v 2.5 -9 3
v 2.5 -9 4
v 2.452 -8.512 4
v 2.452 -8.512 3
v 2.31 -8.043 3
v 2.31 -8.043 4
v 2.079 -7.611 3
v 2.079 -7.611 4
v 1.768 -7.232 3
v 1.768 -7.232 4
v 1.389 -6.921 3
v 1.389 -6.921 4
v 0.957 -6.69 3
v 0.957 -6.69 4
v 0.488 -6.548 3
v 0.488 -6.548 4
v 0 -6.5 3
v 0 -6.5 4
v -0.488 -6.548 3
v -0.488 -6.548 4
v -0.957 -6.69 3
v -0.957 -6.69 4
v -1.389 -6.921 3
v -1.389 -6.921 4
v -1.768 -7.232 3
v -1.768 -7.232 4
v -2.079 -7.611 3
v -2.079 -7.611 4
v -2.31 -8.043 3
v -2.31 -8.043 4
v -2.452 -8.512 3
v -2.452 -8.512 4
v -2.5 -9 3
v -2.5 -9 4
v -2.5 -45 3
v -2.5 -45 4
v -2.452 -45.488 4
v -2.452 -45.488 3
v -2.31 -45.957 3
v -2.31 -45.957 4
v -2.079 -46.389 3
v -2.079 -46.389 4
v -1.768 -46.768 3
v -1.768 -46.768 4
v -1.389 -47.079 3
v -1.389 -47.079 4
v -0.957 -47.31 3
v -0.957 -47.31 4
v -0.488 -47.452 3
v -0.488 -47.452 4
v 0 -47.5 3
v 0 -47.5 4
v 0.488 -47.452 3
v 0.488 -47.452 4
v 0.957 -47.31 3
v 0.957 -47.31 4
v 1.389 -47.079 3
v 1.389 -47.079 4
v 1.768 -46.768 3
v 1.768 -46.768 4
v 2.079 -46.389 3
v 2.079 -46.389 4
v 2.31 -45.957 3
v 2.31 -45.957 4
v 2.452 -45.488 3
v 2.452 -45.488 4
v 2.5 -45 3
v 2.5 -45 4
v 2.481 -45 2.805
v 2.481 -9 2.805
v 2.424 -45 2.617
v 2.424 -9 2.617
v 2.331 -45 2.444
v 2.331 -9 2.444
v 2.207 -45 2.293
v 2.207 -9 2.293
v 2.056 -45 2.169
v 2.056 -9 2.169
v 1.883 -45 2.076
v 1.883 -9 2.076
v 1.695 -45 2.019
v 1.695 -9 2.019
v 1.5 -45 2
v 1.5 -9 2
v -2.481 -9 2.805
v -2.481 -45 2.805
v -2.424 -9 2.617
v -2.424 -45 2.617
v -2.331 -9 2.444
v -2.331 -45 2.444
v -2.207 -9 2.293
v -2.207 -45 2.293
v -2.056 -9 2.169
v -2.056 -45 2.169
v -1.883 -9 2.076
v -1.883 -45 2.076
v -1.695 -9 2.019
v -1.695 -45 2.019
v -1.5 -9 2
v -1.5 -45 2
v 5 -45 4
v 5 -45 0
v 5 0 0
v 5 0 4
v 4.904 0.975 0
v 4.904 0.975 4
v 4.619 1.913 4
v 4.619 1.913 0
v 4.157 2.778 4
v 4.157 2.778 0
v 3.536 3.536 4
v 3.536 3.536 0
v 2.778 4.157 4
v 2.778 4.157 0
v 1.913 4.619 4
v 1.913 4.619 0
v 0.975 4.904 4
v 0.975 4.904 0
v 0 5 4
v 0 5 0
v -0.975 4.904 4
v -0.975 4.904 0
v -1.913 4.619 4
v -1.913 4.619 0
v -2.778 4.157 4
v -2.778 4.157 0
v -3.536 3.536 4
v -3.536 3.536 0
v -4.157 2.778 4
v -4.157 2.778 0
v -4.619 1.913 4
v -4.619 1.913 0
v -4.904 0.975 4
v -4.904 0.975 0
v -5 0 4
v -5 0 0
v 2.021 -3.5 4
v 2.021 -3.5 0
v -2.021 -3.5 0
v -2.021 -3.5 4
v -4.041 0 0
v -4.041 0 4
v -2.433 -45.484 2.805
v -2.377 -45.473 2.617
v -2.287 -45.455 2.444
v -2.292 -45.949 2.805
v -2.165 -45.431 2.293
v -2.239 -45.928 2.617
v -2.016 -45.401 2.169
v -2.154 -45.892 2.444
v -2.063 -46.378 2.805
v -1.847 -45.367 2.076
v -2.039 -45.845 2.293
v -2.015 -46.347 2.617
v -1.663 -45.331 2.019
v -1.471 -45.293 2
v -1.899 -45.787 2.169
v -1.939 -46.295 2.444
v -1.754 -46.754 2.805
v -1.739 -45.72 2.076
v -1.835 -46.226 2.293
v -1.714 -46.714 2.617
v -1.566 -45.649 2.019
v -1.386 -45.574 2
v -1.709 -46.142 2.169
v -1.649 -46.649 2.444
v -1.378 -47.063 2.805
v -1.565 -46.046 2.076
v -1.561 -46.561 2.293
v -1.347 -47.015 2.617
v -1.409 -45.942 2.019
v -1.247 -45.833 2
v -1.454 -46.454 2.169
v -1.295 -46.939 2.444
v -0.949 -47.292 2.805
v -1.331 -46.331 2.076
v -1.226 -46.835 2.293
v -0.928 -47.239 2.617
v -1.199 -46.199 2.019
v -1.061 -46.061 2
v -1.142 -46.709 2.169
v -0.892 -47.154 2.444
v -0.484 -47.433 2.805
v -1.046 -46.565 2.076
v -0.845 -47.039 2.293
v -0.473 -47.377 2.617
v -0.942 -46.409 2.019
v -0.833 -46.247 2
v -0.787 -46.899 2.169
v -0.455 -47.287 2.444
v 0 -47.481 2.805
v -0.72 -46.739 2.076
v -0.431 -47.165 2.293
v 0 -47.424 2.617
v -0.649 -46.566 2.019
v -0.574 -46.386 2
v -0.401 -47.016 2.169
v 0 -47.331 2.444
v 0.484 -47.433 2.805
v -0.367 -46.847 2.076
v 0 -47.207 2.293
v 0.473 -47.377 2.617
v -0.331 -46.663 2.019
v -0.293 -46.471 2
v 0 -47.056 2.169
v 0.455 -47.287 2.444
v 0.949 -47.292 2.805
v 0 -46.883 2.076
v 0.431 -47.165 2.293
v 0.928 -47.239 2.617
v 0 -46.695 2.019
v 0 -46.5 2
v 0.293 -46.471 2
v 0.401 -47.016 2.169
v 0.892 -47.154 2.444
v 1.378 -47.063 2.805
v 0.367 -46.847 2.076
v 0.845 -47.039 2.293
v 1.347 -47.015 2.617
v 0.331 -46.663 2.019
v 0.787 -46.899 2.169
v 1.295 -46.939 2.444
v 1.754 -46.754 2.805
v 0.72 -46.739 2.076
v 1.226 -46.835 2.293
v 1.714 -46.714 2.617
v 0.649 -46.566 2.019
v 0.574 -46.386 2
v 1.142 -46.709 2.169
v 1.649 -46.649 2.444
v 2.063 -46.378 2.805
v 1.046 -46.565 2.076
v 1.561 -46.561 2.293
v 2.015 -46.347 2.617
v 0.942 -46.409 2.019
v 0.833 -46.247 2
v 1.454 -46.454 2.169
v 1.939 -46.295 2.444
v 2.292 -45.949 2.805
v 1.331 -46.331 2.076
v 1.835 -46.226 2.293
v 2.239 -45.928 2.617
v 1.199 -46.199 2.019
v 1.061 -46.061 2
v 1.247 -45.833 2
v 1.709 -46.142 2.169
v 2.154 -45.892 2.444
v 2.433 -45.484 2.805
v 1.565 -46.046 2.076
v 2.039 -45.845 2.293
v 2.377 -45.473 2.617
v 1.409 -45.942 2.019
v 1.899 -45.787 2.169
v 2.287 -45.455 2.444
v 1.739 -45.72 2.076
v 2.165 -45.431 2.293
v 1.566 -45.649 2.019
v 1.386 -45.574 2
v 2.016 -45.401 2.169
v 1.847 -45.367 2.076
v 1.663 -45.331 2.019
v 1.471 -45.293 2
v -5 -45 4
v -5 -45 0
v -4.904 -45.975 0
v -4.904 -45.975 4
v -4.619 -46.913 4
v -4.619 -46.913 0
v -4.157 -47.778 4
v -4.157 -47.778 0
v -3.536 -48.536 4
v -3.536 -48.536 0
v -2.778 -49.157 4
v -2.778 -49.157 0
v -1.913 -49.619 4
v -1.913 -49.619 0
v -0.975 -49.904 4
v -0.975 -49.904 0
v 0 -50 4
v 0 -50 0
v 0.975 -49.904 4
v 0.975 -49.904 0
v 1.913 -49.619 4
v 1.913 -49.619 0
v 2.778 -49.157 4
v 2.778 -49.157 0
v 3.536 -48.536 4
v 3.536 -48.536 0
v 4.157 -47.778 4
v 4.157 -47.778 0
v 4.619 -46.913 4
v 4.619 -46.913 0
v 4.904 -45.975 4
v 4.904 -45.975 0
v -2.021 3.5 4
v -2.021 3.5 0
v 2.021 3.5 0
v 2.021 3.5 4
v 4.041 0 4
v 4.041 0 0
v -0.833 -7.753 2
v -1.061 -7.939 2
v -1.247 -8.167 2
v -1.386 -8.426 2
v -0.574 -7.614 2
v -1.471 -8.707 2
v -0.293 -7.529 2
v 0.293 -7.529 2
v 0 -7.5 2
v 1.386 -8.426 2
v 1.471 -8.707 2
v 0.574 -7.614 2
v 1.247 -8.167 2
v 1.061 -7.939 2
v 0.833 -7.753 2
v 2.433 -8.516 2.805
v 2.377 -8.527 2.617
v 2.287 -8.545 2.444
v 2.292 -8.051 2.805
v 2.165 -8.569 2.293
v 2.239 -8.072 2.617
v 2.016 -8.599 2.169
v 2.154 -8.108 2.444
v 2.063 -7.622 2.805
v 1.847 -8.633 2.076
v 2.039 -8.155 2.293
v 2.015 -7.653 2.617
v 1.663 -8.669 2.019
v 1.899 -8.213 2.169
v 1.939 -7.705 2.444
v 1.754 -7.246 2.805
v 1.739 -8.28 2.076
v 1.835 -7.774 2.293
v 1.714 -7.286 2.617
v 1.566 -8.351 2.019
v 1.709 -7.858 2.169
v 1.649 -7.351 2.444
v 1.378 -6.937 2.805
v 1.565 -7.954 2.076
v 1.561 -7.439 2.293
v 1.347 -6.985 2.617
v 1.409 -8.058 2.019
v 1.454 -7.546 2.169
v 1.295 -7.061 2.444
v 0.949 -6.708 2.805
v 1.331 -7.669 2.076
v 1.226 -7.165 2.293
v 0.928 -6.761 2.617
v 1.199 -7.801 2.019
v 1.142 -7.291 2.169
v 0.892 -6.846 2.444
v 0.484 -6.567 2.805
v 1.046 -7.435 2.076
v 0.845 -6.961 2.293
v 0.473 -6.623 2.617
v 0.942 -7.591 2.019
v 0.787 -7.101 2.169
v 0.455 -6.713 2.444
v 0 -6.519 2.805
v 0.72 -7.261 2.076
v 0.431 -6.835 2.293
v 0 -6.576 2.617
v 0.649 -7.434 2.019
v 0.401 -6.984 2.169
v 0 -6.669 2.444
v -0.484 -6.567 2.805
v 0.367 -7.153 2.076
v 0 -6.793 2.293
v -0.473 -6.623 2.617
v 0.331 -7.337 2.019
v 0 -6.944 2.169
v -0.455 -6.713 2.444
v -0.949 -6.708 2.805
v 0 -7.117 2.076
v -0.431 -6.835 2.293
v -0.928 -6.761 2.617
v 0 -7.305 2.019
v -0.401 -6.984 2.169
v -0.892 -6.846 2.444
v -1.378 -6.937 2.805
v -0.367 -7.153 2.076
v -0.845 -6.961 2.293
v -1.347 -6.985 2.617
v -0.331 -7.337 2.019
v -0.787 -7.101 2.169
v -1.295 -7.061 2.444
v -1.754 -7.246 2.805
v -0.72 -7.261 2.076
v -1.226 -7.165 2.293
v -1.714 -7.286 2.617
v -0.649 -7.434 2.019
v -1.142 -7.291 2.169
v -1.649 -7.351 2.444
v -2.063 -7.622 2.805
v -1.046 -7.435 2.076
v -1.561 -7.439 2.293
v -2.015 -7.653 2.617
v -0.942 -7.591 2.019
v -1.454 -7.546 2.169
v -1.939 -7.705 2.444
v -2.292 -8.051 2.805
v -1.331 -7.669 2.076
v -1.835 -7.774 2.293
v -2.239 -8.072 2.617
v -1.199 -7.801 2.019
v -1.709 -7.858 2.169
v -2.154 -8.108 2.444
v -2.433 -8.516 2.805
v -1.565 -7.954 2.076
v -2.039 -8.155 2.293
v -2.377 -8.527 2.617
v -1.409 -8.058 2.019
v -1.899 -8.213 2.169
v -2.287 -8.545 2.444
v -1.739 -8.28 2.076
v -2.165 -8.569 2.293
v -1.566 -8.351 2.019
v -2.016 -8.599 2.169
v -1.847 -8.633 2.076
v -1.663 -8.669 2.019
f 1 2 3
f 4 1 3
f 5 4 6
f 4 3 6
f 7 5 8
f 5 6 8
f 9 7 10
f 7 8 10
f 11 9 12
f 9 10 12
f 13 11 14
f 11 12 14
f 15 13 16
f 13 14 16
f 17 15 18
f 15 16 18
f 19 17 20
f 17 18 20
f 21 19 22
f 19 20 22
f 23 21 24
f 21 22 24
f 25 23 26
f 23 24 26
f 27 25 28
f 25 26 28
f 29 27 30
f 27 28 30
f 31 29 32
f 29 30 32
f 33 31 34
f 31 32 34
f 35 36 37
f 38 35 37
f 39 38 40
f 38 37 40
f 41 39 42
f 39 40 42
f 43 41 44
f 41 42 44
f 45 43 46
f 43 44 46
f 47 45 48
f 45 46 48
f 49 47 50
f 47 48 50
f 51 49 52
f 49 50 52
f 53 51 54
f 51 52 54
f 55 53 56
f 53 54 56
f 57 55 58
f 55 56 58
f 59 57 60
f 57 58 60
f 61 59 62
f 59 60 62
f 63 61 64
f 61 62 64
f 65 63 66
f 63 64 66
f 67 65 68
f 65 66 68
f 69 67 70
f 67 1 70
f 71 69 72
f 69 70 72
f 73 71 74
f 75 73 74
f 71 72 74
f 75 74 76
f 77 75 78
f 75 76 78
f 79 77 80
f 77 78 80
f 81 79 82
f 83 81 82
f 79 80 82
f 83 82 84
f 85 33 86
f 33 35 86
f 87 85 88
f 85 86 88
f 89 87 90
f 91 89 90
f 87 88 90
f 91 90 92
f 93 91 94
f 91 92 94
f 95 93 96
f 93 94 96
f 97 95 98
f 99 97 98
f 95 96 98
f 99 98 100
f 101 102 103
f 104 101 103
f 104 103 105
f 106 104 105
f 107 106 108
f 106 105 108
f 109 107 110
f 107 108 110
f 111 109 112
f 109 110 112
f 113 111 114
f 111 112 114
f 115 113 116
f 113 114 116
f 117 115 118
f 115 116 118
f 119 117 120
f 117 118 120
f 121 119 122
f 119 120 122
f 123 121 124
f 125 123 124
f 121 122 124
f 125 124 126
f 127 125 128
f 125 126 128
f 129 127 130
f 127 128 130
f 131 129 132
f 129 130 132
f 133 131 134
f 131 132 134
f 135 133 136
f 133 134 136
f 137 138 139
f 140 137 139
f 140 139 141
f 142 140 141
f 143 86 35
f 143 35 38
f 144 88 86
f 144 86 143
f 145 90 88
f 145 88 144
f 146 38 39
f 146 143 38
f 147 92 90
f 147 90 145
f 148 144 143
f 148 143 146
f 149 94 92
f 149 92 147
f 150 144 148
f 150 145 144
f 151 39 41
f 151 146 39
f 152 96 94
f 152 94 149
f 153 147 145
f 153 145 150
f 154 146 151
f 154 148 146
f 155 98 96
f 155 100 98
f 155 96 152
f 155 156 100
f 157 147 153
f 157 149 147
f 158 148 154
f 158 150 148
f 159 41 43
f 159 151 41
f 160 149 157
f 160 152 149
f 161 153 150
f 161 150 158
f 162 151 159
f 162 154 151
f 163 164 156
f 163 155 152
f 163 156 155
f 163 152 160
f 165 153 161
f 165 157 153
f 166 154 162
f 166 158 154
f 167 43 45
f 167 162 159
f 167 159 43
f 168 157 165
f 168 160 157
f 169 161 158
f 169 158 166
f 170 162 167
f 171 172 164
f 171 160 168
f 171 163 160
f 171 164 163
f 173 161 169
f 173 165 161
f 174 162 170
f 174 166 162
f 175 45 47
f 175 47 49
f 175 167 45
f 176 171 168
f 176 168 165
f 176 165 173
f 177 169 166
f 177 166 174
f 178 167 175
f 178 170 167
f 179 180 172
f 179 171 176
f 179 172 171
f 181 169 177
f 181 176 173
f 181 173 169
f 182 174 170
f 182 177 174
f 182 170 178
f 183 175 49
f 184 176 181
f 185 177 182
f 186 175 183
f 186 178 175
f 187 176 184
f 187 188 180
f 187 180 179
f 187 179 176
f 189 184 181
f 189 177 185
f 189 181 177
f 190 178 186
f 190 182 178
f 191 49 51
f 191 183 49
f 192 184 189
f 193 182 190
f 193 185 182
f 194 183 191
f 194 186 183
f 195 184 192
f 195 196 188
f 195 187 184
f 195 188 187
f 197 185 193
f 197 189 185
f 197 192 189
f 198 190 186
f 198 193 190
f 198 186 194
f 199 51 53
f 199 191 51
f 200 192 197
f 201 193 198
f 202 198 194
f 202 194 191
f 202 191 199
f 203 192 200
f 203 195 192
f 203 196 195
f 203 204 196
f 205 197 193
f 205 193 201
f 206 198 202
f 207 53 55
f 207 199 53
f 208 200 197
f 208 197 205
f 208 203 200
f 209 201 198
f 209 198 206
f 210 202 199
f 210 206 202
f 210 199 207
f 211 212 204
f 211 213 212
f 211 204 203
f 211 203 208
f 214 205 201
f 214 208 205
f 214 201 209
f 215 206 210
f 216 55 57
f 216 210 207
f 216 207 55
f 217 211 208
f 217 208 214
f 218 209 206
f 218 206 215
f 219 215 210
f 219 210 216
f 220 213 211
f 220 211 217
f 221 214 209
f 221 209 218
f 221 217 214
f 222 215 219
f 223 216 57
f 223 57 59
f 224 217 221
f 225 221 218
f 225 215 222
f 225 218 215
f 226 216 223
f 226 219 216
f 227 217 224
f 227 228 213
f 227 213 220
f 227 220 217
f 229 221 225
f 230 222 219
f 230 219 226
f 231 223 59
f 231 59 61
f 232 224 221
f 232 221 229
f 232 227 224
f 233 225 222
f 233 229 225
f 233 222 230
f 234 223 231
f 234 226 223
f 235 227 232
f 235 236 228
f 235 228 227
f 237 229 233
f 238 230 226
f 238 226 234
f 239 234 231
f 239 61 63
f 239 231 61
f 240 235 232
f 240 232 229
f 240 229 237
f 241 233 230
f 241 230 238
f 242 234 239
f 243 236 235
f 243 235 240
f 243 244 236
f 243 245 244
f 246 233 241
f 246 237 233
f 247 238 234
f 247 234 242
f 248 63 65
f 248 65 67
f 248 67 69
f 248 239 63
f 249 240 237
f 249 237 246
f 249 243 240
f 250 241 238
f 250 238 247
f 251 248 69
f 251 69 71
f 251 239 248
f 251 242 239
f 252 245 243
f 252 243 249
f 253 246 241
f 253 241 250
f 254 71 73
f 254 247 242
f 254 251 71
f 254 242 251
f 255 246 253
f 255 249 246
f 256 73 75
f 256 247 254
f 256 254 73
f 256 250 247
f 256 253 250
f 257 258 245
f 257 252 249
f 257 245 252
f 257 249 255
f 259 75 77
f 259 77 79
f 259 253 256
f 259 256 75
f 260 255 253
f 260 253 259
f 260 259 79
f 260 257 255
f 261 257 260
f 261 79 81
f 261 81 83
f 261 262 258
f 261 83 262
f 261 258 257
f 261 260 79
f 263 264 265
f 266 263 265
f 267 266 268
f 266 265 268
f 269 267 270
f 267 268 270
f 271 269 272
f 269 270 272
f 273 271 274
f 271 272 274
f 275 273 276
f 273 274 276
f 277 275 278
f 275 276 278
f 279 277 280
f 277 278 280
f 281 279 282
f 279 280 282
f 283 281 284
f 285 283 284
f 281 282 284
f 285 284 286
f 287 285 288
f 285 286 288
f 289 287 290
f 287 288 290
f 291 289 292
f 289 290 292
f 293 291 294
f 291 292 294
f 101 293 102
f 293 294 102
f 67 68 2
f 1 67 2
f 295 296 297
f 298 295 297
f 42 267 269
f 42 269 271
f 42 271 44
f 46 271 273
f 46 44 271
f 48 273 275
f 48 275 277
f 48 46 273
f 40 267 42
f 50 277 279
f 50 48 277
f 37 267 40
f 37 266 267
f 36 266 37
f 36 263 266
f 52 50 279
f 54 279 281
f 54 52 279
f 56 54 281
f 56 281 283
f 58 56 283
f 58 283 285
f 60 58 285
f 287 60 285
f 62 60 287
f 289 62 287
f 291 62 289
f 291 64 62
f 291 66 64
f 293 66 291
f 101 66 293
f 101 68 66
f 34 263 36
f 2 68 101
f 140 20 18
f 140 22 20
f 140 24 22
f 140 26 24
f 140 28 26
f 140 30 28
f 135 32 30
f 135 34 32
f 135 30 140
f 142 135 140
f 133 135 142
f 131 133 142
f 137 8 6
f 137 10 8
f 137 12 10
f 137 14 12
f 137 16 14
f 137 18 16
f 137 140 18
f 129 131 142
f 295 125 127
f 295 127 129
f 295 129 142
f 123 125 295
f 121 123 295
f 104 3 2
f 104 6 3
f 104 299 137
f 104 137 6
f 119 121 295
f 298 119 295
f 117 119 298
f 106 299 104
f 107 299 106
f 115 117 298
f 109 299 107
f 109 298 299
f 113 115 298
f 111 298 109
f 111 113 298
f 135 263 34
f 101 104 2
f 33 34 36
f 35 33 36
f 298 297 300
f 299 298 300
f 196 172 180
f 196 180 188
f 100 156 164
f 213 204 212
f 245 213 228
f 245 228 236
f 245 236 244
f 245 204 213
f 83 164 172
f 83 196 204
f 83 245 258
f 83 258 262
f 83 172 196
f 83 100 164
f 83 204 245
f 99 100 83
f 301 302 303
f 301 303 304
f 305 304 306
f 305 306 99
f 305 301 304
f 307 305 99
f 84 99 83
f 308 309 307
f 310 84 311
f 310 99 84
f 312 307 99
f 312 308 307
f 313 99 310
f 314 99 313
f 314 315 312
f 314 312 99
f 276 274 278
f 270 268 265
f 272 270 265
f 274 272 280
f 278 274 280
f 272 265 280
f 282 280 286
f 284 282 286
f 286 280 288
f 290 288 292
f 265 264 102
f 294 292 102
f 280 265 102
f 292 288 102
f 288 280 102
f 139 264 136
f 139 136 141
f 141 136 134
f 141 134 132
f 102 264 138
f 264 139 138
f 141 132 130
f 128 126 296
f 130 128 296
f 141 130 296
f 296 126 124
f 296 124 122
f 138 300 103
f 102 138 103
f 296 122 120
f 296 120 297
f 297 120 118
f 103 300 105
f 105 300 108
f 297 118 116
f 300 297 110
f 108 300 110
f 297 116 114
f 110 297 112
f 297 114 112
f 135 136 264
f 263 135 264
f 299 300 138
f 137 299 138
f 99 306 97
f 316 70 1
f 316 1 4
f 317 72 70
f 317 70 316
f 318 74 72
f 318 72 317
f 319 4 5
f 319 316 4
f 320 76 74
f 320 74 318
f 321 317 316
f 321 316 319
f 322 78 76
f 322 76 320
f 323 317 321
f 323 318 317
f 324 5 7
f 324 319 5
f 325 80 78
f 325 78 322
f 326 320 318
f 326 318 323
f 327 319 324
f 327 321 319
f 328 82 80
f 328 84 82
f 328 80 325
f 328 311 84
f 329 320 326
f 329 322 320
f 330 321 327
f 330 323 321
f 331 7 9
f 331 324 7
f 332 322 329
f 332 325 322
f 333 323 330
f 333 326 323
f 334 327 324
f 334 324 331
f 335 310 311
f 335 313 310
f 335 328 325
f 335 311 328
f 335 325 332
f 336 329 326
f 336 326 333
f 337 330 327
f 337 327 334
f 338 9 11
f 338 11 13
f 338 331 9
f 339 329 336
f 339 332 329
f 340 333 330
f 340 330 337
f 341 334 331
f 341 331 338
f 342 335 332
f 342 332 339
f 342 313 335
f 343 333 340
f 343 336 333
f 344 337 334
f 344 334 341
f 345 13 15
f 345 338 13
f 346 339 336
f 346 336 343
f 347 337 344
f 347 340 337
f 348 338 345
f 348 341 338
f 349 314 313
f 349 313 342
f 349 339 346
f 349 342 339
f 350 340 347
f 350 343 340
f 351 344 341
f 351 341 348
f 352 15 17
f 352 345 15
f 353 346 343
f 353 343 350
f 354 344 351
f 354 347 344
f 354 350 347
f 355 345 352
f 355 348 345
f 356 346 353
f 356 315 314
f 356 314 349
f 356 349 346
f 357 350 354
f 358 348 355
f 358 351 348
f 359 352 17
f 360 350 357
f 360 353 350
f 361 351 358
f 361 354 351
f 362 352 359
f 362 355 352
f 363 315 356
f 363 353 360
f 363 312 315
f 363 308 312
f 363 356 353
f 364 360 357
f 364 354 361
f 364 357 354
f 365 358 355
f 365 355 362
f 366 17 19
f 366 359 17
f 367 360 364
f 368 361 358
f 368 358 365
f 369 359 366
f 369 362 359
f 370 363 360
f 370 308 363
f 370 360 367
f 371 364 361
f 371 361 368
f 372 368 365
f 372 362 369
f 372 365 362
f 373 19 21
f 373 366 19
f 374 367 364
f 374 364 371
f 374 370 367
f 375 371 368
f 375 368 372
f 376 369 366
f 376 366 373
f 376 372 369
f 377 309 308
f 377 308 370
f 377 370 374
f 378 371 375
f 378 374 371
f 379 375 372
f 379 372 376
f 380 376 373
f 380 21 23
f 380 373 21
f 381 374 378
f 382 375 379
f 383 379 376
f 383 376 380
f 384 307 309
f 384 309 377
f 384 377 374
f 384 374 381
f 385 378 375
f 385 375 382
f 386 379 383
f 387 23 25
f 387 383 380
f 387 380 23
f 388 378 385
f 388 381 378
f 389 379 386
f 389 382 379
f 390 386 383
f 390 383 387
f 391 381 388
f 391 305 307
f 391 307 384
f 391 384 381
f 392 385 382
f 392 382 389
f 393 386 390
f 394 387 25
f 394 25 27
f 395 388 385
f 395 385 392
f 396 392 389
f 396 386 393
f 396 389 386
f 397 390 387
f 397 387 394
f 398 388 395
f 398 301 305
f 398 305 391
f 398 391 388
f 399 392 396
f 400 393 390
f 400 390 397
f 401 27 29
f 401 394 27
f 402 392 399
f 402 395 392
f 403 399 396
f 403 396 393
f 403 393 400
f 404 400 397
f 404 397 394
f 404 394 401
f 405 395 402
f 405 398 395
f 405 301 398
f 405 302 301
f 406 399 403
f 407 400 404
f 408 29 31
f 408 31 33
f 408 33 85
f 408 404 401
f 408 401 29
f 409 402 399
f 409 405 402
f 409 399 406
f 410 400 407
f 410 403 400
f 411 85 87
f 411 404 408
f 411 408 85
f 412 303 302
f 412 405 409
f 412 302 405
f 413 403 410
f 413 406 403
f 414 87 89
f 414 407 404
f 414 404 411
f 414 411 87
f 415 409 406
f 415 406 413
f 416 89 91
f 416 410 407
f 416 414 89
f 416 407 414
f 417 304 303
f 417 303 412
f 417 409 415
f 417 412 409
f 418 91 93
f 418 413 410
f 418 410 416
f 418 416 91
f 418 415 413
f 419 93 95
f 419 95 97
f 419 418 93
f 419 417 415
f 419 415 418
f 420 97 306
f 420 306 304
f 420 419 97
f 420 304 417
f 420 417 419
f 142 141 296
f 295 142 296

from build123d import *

# Parameters (mm, degrees)
F1_DEPTH = 4
F3_DEPTH = 2
F4_R     = 1


with BuildPart() as f1:
    # F0 (on Top) → F1 (new body)
    with BuildSketch(Plane.XY):
        with BuildLine():
            ThreePointArc((-5, 0), (0, -5), (5, 0))
            ThreePointArc((5, 0), (0, 5), (-5, 0))
        make_face()
        Polygon((-4.041452, 0), (-2.020726, 3.5), (2.020726, 3.5), (4.041452, 0), (2.020726, -3.5), (-2.020726, -3.5), align=None, mode=Mode.SUBTRACT)
        with BuildLine():
            Line((5, -45), (5, 0))
            ThreePointArc((5, 0), (0, -5), (-5, 0))
            Line((-5, 0), (-5, -45))
            ThreePointArc((-5, -45), (0, -50), (5, -45))
        make_face()
    extrude(amount=F1_DEPTH)

    # F2 (on face) → F3 (cut)
    with BuildSketch(Plane.XY.offset(4)):
        with BuildLine():
            ThreePointArc((2.5, -9), (0, -6.5), (-2.5, -9))
            Line((-2.5, -9), (-2.5, -45))
            ThreePointArc((-2.5, -45), (0, -47.5), (2.5, -45))
            Line((2.5, -45), (2.5, -9))
        make_face()
    extrude(amount=-F3_DEPTH, mode=Mode.SUBTRACT)

    # F4
    f4_edges = [f1.edges().sort_by_distance(p)[0] for p in [
        (0, -6.5, 2),
        (-2.5, -27, 2),
        (0, -47.5, 2),
        (2.5, -27, 2),
    ]]
    fillet(f4_edges, radius=F4_R)


solid = f1.part
